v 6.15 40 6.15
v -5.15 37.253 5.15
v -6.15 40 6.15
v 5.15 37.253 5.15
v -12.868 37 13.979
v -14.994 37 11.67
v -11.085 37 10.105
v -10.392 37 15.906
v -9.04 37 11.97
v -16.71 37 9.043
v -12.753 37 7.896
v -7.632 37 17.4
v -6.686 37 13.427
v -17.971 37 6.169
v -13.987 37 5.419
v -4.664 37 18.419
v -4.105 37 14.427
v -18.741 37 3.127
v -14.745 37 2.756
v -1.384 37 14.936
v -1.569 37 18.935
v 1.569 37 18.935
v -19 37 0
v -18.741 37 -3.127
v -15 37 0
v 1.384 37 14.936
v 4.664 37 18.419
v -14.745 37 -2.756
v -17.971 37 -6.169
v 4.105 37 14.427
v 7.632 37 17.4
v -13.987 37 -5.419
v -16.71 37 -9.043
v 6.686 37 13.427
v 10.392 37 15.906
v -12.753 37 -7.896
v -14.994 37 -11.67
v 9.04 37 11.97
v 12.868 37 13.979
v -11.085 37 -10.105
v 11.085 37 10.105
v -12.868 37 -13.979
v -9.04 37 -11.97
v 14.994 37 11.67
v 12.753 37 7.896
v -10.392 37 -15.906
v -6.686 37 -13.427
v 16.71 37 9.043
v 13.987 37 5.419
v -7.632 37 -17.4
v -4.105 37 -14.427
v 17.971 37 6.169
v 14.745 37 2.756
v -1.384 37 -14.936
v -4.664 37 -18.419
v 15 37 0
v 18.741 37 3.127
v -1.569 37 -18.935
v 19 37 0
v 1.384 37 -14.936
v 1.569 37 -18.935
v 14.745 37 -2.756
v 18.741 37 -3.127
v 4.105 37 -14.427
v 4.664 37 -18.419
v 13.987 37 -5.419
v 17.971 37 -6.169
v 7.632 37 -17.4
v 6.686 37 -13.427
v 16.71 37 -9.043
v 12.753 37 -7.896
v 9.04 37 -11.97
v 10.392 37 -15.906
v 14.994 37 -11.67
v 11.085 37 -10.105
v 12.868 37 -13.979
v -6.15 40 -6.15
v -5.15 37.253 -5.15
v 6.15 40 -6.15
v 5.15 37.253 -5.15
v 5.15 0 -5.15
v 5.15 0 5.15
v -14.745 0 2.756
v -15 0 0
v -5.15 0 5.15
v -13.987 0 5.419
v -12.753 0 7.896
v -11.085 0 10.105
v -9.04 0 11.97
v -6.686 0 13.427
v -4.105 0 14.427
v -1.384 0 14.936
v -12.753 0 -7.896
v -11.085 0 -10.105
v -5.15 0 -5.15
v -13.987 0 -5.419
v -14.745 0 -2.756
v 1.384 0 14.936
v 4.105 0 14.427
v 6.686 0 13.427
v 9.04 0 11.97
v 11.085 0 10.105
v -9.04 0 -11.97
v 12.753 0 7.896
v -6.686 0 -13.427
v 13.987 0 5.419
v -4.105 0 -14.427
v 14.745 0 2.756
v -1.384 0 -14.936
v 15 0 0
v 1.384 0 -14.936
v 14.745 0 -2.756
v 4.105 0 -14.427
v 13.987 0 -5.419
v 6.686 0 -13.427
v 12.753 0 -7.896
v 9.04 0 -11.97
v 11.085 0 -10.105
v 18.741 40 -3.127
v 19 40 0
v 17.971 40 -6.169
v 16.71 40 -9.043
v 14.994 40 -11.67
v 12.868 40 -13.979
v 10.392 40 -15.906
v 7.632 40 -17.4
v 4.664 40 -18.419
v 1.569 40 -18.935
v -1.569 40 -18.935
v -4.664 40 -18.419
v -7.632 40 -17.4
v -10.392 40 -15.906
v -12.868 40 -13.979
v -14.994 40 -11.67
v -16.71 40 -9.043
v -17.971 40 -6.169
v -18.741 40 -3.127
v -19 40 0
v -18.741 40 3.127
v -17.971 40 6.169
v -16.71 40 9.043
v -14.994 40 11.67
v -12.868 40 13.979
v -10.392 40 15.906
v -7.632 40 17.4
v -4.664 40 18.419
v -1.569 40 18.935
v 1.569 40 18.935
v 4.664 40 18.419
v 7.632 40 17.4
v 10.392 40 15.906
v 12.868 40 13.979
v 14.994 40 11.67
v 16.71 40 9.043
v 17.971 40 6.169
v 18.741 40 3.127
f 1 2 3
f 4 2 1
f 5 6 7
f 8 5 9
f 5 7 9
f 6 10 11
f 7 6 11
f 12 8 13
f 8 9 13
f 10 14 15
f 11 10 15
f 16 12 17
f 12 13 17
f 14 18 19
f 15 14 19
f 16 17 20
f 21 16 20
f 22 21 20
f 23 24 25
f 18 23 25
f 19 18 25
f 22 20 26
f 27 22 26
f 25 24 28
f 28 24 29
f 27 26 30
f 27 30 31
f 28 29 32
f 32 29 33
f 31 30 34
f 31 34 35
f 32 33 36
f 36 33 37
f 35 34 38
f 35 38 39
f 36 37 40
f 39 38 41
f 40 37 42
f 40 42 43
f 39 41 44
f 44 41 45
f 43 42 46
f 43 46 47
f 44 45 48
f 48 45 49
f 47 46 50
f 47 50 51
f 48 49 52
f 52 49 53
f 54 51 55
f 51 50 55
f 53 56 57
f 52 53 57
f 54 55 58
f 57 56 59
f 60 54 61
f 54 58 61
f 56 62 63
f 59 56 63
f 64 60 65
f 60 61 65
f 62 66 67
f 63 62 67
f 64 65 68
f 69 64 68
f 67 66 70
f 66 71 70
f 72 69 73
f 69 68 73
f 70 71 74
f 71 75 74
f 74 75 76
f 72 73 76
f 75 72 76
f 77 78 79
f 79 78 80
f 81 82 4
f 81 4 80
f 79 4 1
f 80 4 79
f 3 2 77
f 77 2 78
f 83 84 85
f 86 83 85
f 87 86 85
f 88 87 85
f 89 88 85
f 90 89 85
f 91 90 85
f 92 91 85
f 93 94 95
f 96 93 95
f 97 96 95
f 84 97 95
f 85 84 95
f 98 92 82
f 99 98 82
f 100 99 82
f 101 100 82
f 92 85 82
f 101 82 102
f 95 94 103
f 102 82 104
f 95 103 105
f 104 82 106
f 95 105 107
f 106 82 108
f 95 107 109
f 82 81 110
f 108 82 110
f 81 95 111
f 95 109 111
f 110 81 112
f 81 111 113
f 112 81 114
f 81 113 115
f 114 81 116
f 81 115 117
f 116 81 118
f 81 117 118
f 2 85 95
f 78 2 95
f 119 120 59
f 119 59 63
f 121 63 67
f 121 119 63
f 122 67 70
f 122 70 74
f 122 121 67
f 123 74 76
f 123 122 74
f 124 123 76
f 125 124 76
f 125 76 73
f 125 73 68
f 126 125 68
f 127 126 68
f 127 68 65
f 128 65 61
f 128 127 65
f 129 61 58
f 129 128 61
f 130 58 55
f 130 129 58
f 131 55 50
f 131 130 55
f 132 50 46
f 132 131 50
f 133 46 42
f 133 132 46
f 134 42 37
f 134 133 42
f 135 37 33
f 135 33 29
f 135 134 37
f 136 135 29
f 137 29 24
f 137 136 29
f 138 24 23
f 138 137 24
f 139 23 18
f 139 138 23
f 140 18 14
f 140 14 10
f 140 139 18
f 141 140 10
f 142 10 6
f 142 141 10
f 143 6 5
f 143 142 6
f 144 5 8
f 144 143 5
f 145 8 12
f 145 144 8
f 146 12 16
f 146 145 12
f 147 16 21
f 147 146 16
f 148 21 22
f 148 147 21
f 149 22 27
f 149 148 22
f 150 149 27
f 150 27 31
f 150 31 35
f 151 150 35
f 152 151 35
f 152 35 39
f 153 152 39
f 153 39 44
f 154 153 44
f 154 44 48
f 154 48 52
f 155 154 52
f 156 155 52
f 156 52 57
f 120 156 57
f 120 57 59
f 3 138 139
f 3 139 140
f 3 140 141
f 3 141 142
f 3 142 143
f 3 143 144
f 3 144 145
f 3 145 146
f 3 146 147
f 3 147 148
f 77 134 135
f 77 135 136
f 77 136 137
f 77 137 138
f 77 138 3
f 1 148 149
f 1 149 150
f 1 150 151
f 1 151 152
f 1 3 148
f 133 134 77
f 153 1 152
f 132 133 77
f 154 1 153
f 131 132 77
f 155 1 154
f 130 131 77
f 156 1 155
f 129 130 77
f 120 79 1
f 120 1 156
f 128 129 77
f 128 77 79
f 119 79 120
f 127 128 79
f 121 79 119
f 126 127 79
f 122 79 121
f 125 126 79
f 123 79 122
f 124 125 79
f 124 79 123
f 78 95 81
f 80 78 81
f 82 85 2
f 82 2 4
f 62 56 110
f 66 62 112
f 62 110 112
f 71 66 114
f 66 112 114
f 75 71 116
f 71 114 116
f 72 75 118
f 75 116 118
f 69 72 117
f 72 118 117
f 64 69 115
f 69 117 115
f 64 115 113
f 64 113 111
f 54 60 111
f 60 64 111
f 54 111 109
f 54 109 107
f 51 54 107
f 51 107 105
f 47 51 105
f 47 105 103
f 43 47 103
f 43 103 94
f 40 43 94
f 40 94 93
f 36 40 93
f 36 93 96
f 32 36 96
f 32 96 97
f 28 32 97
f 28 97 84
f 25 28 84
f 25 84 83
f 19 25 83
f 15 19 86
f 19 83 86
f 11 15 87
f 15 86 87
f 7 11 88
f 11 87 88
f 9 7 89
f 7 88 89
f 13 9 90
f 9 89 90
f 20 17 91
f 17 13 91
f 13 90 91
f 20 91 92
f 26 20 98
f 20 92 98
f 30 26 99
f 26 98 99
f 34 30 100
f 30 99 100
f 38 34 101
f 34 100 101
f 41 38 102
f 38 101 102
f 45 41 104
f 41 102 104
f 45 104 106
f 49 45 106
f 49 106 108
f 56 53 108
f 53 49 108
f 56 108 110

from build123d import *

# Parameters (mm, degrees)
SKETCH_1_R          = 15
SKETCH_1_W          = 10.3
SKETCH_1_H          = 10.3
EXTRUDE_1_DEPTH     = 40
SKETCH1_R           = 19
SKETCH1_W           = 10.3
SKETCH1_H           = 10.3
BOSS_EXTRUDE1_DEPTH = 3
CHAMFER1_SIZE       = 1
CHAMFER1_SIZE2      = 2.747477419


with BuildPart() as part:
    # Эскиз1 → Бобышка-Вытянуть1 (new body)
    with BuildSketch(Plane(origin=(0, 0, 0), x_dir=(1, 0, 0), z_dir=(0, 1, 0))):
        Circle(SKETCH_1_R)
        Rectangle(SKETCH_1_W, SKETCH_1_H, mode=Mode.SUBTRACT)
    extrude(amount=EXTRUDE_1_DEPTH)

    # Sketch1 → Boss-Extrude1 (add)
    with BuildSketch(Plane(origin=(0, 40, 0), x_dir=(1, 0, 0), z_dir=(0, 1, 0))):
        Circle(SKETCH1_R)
        Rectangle(SKETCH1_W, SKETCH1_H, mode=Mode.SUBTRACT)
    extrude(amount=-BOSS_EXTRUDE1_DEPTH)

    # Chamfer1
    chamfer1_edges = [part.edges().sort_by_distance(p)[0] for p in [
        (0, 40, -5.15),
        (-5.15, 40, 0),
        (0, 40, 5.15),
        (5.15, 40, 0),
    ]]
    chamfer1_side = [part.faces().sort_by_distance(p)[0] for p in [
        (-18.462598846, 40, 0),
    ]]
    chamfer(chamfer1_edges, length=CHAMFER1_SIZE, length2=CHAMFER1_SIZE2, reference=chamfer1_side[0])


solid = part.part
